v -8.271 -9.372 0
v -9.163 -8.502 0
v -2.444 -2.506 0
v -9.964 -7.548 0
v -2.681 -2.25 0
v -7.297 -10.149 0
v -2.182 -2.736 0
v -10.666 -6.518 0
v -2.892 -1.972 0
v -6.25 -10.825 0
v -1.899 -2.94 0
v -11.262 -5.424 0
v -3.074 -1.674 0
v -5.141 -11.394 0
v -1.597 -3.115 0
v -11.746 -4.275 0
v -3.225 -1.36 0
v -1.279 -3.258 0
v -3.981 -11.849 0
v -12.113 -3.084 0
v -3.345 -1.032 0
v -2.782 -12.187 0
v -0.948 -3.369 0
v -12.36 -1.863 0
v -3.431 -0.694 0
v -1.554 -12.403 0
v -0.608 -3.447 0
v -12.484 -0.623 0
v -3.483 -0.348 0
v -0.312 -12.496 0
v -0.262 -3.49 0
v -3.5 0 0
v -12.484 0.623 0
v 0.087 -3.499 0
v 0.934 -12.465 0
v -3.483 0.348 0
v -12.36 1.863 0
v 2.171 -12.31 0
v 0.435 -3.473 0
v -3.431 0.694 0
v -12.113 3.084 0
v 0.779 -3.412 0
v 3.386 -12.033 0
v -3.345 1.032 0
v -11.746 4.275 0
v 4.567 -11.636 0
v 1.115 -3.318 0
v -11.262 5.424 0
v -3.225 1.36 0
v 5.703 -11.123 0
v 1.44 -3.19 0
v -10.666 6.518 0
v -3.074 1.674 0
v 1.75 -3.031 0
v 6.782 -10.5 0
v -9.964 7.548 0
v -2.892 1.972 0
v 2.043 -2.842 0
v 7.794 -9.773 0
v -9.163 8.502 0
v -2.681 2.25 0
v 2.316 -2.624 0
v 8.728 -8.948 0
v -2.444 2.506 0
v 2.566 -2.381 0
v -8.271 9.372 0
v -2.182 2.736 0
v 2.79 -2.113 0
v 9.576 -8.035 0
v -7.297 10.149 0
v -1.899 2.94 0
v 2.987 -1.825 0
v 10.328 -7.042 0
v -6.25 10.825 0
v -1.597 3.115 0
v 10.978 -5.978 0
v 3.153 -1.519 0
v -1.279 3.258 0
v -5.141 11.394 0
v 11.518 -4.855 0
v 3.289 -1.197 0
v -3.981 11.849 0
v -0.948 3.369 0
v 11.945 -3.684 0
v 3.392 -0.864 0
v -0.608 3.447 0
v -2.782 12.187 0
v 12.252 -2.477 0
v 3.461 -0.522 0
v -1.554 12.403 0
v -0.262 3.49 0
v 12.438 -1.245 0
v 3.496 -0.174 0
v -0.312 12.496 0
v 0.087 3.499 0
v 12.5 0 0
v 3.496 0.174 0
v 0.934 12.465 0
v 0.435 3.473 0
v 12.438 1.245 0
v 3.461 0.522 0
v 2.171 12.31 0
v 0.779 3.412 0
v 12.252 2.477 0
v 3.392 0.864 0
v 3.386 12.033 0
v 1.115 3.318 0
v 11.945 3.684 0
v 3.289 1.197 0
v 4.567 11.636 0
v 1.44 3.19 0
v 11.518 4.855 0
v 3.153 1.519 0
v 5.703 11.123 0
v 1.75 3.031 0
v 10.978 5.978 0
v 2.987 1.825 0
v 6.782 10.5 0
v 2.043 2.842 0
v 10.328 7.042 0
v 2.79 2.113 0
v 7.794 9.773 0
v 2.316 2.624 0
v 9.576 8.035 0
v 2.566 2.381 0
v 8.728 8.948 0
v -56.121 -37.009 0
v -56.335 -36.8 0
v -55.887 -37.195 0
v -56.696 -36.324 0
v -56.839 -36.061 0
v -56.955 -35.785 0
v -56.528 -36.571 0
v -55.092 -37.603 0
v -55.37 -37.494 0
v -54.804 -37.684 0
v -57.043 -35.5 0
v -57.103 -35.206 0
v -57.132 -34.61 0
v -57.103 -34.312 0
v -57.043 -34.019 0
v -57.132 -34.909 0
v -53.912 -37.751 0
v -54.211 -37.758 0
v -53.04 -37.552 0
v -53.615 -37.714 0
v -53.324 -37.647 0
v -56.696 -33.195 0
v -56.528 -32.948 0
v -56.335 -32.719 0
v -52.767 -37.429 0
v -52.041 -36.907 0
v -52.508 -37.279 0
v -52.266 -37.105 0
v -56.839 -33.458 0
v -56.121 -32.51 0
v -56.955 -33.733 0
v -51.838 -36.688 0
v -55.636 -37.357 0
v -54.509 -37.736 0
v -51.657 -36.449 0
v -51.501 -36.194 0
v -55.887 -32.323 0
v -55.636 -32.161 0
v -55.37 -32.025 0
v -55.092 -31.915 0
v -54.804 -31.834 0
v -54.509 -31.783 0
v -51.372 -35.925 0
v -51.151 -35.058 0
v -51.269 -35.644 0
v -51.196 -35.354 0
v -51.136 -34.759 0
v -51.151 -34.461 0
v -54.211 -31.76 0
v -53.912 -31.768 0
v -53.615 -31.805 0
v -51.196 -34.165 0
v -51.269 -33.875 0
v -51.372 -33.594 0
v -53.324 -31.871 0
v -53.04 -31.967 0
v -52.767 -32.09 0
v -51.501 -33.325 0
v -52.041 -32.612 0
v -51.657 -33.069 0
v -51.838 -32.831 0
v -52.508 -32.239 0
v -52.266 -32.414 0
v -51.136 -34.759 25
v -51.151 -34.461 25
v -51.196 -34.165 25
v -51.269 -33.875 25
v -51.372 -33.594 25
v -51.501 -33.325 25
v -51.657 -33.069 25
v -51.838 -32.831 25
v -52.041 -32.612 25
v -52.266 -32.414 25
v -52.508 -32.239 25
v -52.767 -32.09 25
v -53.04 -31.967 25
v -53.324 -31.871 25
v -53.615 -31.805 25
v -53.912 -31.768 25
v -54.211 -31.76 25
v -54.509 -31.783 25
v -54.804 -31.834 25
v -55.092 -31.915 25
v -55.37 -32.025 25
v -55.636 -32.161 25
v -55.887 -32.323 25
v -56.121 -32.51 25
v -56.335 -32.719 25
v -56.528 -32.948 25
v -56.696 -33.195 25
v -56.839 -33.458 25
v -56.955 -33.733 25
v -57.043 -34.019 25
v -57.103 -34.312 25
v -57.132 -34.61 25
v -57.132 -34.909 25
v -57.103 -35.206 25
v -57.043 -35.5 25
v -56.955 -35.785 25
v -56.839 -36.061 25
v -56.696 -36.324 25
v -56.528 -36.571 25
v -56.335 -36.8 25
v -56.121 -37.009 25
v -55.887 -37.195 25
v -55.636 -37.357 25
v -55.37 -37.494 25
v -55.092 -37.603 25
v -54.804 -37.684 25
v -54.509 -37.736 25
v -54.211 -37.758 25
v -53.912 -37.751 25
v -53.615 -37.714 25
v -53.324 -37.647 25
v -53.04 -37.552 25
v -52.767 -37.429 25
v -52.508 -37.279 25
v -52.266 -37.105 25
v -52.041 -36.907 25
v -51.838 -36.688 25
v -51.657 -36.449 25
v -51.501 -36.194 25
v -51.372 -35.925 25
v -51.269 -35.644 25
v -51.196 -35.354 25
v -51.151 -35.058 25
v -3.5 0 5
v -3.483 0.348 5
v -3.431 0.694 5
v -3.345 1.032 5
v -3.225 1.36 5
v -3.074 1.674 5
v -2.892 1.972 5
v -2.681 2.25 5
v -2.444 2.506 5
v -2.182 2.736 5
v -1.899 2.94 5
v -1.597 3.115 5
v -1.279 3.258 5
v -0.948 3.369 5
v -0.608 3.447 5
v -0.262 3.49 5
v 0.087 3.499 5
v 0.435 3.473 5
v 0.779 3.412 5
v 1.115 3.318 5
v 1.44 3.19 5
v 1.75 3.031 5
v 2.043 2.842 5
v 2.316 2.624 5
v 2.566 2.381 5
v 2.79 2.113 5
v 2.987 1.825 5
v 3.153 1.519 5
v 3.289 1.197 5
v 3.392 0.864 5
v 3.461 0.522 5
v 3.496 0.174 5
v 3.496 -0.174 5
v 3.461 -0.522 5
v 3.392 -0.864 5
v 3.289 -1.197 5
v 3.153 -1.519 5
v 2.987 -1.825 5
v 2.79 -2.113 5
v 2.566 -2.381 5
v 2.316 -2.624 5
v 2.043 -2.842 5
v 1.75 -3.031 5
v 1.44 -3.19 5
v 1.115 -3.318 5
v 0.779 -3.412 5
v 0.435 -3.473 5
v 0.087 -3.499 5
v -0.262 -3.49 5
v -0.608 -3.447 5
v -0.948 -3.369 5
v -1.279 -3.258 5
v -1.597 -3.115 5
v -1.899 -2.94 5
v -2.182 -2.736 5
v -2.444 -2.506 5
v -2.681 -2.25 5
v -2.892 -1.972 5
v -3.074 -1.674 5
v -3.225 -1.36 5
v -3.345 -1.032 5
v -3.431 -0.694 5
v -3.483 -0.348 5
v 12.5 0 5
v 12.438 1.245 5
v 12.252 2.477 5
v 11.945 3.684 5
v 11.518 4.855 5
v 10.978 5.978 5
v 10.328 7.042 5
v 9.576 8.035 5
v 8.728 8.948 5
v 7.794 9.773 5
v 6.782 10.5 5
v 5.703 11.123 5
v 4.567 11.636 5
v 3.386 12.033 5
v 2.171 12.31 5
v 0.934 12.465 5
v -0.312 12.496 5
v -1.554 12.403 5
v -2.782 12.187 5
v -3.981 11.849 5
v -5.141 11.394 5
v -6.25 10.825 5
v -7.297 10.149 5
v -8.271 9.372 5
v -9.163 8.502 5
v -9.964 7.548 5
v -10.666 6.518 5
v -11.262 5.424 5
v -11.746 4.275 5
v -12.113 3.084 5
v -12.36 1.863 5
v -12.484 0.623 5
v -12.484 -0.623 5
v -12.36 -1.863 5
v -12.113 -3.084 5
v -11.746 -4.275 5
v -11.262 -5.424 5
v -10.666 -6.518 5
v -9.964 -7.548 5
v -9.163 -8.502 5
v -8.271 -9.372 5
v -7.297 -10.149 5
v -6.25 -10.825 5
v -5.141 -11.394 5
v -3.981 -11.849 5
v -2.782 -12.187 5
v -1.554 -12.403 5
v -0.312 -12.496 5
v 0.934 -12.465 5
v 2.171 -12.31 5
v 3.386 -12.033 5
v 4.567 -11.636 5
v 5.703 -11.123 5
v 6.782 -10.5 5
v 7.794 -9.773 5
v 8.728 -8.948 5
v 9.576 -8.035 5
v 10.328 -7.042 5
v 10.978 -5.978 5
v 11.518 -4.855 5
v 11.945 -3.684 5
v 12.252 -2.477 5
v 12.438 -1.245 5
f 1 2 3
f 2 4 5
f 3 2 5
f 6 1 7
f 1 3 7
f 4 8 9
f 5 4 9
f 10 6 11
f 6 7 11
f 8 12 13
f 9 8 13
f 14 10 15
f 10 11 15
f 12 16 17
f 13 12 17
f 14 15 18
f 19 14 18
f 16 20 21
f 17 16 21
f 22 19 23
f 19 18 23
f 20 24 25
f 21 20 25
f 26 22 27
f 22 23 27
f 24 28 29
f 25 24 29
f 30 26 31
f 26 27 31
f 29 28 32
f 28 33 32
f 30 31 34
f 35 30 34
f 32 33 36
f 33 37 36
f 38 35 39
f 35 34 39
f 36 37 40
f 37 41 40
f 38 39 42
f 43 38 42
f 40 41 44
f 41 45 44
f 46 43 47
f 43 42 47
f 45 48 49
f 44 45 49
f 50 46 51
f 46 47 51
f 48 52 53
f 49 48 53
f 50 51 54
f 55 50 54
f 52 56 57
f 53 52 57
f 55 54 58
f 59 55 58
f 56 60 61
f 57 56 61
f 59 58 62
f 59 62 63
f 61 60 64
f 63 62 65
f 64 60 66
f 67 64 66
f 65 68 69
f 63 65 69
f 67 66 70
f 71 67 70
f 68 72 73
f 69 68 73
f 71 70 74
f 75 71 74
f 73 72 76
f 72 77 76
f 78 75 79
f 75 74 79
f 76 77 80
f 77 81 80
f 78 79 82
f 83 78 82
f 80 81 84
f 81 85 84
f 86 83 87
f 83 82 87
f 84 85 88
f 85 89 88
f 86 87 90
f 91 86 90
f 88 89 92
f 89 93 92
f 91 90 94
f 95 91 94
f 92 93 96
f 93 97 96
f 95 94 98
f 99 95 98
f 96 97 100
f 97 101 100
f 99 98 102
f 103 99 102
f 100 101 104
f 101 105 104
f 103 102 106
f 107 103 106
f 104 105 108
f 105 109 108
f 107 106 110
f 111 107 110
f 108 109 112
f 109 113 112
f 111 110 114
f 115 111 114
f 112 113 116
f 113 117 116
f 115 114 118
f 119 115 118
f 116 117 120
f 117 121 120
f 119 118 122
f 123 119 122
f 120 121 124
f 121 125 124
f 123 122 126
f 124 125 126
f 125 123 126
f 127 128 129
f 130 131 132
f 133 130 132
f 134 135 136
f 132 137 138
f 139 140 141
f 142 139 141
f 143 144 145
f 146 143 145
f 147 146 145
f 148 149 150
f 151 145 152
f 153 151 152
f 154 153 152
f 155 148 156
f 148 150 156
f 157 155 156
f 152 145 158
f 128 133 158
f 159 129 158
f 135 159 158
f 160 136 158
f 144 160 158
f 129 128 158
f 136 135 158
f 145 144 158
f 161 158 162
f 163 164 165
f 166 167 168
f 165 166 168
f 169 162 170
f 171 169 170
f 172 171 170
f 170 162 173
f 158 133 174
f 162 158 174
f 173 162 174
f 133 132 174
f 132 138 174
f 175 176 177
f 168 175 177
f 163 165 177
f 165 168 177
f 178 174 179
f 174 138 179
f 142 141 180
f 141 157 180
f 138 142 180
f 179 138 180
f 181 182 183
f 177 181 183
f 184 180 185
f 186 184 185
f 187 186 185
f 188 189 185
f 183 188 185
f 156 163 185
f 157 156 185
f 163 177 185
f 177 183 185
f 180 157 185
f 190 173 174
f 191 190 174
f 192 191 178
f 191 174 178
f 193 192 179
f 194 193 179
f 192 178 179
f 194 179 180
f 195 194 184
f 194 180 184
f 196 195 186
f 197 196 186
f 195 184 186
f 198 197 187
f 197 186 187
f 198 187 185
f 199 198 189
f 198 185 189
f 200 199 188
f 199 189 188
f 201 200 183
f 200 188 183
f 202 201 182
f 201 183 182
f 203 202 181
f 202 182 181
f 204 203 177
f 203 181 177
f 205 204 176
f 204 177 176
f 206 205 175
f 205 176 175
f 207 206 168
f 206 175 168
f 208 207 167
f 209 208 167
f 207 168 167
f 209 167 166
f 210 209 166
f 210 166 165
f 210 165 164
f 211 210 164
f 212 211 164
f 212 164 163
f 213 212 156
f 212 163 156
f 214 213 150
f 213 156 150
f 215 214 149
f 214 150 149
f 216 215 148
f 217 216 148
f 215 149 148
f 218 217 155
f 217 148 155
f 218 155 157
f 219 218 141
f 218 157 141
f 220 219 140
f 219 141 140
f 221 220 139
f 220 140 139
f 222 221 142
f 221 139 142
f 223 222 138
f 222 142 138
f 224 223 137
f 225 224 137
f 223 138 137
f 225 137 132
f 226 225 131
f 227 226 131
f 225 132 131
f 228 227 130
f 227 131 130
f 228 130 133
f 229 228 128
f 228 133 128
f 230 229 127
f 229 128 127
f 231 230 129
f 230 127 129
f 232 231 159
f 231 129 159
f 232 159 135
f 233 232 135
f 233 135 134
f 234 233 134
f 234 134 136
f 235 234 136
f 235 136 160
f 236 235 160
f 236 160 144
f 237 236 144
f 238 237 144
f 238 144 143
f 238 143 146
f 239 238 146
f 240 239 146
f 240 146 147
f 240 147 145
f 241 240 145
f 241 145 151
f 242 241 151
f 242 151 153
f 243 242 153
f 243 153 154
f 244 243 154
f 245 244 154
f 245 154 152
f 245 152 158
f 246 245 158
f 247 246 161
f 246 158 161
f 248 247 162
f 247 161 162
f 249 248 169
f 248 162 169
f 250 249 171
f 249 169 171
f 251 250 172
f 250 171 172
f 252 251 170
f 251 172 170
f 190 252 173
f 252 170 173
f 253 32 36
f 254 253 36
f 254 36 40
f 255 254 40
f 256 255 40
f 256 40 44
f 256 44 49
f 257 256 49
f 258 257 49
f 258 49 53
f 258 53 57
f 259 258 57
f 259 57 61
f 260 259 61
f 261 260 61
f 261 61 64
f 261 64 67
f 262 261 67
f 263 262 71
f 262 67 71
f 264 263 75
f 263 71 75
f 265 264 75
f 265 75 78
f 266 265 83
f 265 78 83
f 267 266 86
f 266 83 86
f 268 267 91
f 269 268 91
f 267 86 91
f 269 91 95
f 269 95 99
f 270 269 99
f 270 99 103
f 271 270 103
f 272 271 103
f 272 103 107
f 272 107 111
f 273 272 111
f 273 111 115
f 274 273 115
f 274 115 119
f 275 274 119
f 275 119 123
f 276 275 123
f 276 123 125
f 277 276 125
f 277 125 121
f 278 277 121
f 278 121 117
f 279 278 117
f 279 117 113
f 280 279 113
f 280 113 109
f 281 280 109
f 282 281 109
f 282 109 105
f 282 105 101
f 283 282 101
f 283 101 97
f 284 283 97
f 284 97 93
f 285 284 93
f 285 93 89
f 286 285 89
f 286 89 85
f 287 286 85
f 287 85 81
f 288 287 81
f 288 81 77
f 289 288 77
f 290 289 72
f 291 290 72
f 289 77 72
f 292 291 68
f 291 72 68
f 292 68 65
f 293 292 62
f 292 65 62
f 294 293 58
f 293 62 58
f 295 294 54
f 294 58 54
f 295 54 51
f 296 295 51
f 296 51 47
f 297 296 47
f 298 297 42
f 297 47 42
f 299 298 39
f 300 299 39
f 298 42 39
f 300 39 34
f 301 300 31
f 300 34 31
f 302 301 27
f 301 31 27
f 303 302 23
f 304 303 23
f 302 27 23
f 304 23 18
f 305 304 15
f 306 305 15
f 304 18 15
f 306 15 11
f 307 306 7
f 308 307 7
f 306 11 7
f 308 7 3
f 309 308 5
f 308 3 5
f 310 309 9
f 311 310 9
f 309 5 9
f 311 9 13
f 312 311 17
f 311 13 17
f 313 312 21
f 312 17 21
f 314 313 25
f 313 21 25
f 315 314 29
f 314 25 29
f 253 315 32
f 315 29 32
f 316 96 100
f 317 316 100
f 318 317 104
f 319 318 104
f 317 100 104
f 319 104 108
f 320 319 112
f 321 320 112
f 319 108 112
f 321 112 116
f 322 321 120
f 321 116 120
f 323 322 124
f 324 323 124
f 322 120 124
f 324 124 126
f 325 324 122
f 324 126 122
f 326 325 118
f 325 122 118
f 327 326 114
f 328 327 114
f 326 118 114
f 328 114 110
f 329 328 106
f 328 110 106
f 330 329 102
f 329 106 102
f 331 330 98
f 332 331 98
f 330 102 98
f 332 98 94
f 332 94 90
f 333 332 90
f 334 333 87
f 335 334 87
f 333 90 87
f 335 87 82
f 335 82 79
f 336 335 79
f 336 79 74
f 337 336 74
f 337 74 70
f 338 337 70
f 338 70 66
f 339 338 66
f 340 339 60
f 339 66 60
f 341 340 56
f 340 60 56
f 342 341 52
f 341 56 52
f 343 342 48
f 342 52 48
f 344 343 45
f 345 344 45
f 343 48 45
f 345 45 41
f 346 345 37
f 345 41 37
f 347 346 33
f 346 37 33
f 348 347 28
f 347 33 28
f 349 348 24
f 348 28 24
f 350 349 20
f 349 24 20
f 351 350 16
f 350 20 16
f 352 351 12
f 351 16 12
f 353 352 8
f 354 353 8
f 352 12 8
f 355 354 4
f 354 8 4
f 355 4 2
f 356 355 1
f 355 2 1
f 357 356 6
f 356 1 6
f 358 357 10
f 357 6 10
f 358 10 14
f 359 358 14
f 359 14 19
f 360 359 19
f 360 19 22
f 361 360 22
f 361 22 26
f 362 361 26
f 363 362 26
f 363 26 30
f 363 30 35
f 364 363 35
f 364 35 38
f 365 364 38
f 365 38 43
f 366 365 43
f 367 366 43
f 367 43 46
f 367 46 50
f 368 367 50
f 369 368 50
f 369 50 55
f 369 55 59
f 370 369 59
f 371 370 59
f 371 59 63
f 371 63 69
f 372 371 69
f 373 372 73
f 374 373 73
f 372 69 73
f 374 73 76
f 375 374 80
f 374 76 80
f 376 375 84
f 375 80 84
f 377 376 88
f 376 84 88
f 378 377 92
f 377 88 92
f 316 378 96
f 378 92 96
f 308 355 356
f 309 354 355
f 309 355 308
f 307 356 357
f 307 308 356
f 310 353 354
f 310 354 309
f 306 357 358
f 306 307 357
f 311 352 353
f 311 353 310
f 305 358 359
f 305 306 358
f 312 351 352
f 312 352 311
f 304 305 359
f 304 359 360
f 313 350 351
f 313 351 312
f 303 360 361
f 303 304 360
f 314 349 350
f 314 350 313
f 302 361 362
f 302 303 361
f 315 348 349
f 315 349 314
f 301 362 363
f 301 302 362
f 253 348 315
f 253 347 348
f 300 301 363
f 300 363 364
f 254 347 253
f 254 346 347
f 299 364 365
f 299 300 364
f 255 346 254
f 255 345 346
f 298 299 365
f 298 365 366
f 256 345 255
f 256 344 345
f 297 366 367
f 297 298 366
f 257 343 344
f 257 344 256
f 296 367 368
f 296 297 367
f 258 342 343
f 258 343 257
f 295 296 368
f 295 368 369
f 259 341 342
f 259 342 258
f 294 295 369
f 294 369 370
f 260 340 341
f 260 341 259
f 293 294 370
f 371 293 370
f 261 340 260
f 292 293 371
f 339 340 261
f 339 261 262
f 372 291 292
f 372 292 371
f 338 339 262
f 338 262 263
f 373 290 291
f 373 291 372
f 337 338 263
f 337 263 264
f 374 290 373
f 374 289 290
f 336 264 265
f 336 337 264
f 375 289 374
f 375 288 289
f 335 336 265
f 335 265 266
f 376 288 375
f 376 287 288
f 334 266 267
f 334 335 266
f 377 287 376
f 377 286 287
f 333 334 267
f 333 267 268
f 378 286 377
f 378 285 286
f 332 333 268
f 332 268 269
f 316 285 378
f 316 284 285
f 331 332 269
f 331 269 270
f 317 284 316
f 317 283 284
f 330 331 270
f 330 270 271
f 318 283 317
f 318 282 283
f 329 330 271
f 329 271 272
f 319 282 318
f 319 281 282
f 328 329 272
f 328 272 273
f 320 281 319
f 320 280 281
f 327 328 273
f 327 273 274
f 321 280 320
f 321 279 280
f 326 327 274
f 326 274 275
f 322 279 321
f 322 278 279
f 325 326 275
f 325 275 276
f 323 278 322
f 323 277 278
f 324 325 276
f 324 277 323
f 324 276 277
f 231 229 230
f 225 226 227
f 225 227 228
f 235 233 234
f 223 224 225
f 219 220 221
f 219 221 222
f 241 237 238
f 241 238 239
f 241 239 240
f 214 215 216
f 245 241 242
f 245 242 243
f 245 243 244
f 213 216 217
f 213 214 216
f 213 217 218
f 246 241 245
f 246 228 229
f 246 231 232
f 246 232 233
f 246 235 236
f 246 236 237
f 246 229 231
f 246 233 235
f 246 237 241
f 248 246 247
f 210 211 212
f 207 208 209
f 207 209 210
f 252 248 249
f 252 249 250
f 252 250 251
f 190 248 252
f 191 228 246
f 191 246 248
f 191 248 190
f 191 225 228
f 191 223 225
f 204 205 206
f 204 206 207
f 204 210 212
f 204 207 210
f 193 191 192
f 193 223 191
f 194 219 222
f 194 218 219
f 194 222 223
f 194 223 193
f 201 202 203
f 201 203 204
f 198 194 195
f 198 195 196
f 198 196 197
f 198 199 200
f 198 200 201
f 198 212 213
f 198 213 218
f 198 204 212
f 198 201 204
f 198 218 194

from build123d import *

# Parameters (mm, degrees)
F0_R     = 12.5
F1_DEPTH = 5
F3_D     = 7
F4_R     = 3
F5_DEPTH = 25


with BuildPart() as f1:
    # F0 (on Top) → F1 (new body)
    with BuildSketch(Plane.XY):
        Circle(F0_R)
    extrude(amount=F1_DEPTH)

    # F3 (through all)
    with Locations(Plane.XY.offset(5)):
        with Locations((0, 0)):
            Hole(F3_D / 2)


with BuildPart() as f5:
    # F4 (on Top) → F5 (new body)
    with BuildSketch(Plane.XY):
        with Locations((-54.136109, -34.759268)):
            Circle(F4_R)
    extrude(amount=F5_DEPTH)


solid = Compound([f1.part, f5.part])
